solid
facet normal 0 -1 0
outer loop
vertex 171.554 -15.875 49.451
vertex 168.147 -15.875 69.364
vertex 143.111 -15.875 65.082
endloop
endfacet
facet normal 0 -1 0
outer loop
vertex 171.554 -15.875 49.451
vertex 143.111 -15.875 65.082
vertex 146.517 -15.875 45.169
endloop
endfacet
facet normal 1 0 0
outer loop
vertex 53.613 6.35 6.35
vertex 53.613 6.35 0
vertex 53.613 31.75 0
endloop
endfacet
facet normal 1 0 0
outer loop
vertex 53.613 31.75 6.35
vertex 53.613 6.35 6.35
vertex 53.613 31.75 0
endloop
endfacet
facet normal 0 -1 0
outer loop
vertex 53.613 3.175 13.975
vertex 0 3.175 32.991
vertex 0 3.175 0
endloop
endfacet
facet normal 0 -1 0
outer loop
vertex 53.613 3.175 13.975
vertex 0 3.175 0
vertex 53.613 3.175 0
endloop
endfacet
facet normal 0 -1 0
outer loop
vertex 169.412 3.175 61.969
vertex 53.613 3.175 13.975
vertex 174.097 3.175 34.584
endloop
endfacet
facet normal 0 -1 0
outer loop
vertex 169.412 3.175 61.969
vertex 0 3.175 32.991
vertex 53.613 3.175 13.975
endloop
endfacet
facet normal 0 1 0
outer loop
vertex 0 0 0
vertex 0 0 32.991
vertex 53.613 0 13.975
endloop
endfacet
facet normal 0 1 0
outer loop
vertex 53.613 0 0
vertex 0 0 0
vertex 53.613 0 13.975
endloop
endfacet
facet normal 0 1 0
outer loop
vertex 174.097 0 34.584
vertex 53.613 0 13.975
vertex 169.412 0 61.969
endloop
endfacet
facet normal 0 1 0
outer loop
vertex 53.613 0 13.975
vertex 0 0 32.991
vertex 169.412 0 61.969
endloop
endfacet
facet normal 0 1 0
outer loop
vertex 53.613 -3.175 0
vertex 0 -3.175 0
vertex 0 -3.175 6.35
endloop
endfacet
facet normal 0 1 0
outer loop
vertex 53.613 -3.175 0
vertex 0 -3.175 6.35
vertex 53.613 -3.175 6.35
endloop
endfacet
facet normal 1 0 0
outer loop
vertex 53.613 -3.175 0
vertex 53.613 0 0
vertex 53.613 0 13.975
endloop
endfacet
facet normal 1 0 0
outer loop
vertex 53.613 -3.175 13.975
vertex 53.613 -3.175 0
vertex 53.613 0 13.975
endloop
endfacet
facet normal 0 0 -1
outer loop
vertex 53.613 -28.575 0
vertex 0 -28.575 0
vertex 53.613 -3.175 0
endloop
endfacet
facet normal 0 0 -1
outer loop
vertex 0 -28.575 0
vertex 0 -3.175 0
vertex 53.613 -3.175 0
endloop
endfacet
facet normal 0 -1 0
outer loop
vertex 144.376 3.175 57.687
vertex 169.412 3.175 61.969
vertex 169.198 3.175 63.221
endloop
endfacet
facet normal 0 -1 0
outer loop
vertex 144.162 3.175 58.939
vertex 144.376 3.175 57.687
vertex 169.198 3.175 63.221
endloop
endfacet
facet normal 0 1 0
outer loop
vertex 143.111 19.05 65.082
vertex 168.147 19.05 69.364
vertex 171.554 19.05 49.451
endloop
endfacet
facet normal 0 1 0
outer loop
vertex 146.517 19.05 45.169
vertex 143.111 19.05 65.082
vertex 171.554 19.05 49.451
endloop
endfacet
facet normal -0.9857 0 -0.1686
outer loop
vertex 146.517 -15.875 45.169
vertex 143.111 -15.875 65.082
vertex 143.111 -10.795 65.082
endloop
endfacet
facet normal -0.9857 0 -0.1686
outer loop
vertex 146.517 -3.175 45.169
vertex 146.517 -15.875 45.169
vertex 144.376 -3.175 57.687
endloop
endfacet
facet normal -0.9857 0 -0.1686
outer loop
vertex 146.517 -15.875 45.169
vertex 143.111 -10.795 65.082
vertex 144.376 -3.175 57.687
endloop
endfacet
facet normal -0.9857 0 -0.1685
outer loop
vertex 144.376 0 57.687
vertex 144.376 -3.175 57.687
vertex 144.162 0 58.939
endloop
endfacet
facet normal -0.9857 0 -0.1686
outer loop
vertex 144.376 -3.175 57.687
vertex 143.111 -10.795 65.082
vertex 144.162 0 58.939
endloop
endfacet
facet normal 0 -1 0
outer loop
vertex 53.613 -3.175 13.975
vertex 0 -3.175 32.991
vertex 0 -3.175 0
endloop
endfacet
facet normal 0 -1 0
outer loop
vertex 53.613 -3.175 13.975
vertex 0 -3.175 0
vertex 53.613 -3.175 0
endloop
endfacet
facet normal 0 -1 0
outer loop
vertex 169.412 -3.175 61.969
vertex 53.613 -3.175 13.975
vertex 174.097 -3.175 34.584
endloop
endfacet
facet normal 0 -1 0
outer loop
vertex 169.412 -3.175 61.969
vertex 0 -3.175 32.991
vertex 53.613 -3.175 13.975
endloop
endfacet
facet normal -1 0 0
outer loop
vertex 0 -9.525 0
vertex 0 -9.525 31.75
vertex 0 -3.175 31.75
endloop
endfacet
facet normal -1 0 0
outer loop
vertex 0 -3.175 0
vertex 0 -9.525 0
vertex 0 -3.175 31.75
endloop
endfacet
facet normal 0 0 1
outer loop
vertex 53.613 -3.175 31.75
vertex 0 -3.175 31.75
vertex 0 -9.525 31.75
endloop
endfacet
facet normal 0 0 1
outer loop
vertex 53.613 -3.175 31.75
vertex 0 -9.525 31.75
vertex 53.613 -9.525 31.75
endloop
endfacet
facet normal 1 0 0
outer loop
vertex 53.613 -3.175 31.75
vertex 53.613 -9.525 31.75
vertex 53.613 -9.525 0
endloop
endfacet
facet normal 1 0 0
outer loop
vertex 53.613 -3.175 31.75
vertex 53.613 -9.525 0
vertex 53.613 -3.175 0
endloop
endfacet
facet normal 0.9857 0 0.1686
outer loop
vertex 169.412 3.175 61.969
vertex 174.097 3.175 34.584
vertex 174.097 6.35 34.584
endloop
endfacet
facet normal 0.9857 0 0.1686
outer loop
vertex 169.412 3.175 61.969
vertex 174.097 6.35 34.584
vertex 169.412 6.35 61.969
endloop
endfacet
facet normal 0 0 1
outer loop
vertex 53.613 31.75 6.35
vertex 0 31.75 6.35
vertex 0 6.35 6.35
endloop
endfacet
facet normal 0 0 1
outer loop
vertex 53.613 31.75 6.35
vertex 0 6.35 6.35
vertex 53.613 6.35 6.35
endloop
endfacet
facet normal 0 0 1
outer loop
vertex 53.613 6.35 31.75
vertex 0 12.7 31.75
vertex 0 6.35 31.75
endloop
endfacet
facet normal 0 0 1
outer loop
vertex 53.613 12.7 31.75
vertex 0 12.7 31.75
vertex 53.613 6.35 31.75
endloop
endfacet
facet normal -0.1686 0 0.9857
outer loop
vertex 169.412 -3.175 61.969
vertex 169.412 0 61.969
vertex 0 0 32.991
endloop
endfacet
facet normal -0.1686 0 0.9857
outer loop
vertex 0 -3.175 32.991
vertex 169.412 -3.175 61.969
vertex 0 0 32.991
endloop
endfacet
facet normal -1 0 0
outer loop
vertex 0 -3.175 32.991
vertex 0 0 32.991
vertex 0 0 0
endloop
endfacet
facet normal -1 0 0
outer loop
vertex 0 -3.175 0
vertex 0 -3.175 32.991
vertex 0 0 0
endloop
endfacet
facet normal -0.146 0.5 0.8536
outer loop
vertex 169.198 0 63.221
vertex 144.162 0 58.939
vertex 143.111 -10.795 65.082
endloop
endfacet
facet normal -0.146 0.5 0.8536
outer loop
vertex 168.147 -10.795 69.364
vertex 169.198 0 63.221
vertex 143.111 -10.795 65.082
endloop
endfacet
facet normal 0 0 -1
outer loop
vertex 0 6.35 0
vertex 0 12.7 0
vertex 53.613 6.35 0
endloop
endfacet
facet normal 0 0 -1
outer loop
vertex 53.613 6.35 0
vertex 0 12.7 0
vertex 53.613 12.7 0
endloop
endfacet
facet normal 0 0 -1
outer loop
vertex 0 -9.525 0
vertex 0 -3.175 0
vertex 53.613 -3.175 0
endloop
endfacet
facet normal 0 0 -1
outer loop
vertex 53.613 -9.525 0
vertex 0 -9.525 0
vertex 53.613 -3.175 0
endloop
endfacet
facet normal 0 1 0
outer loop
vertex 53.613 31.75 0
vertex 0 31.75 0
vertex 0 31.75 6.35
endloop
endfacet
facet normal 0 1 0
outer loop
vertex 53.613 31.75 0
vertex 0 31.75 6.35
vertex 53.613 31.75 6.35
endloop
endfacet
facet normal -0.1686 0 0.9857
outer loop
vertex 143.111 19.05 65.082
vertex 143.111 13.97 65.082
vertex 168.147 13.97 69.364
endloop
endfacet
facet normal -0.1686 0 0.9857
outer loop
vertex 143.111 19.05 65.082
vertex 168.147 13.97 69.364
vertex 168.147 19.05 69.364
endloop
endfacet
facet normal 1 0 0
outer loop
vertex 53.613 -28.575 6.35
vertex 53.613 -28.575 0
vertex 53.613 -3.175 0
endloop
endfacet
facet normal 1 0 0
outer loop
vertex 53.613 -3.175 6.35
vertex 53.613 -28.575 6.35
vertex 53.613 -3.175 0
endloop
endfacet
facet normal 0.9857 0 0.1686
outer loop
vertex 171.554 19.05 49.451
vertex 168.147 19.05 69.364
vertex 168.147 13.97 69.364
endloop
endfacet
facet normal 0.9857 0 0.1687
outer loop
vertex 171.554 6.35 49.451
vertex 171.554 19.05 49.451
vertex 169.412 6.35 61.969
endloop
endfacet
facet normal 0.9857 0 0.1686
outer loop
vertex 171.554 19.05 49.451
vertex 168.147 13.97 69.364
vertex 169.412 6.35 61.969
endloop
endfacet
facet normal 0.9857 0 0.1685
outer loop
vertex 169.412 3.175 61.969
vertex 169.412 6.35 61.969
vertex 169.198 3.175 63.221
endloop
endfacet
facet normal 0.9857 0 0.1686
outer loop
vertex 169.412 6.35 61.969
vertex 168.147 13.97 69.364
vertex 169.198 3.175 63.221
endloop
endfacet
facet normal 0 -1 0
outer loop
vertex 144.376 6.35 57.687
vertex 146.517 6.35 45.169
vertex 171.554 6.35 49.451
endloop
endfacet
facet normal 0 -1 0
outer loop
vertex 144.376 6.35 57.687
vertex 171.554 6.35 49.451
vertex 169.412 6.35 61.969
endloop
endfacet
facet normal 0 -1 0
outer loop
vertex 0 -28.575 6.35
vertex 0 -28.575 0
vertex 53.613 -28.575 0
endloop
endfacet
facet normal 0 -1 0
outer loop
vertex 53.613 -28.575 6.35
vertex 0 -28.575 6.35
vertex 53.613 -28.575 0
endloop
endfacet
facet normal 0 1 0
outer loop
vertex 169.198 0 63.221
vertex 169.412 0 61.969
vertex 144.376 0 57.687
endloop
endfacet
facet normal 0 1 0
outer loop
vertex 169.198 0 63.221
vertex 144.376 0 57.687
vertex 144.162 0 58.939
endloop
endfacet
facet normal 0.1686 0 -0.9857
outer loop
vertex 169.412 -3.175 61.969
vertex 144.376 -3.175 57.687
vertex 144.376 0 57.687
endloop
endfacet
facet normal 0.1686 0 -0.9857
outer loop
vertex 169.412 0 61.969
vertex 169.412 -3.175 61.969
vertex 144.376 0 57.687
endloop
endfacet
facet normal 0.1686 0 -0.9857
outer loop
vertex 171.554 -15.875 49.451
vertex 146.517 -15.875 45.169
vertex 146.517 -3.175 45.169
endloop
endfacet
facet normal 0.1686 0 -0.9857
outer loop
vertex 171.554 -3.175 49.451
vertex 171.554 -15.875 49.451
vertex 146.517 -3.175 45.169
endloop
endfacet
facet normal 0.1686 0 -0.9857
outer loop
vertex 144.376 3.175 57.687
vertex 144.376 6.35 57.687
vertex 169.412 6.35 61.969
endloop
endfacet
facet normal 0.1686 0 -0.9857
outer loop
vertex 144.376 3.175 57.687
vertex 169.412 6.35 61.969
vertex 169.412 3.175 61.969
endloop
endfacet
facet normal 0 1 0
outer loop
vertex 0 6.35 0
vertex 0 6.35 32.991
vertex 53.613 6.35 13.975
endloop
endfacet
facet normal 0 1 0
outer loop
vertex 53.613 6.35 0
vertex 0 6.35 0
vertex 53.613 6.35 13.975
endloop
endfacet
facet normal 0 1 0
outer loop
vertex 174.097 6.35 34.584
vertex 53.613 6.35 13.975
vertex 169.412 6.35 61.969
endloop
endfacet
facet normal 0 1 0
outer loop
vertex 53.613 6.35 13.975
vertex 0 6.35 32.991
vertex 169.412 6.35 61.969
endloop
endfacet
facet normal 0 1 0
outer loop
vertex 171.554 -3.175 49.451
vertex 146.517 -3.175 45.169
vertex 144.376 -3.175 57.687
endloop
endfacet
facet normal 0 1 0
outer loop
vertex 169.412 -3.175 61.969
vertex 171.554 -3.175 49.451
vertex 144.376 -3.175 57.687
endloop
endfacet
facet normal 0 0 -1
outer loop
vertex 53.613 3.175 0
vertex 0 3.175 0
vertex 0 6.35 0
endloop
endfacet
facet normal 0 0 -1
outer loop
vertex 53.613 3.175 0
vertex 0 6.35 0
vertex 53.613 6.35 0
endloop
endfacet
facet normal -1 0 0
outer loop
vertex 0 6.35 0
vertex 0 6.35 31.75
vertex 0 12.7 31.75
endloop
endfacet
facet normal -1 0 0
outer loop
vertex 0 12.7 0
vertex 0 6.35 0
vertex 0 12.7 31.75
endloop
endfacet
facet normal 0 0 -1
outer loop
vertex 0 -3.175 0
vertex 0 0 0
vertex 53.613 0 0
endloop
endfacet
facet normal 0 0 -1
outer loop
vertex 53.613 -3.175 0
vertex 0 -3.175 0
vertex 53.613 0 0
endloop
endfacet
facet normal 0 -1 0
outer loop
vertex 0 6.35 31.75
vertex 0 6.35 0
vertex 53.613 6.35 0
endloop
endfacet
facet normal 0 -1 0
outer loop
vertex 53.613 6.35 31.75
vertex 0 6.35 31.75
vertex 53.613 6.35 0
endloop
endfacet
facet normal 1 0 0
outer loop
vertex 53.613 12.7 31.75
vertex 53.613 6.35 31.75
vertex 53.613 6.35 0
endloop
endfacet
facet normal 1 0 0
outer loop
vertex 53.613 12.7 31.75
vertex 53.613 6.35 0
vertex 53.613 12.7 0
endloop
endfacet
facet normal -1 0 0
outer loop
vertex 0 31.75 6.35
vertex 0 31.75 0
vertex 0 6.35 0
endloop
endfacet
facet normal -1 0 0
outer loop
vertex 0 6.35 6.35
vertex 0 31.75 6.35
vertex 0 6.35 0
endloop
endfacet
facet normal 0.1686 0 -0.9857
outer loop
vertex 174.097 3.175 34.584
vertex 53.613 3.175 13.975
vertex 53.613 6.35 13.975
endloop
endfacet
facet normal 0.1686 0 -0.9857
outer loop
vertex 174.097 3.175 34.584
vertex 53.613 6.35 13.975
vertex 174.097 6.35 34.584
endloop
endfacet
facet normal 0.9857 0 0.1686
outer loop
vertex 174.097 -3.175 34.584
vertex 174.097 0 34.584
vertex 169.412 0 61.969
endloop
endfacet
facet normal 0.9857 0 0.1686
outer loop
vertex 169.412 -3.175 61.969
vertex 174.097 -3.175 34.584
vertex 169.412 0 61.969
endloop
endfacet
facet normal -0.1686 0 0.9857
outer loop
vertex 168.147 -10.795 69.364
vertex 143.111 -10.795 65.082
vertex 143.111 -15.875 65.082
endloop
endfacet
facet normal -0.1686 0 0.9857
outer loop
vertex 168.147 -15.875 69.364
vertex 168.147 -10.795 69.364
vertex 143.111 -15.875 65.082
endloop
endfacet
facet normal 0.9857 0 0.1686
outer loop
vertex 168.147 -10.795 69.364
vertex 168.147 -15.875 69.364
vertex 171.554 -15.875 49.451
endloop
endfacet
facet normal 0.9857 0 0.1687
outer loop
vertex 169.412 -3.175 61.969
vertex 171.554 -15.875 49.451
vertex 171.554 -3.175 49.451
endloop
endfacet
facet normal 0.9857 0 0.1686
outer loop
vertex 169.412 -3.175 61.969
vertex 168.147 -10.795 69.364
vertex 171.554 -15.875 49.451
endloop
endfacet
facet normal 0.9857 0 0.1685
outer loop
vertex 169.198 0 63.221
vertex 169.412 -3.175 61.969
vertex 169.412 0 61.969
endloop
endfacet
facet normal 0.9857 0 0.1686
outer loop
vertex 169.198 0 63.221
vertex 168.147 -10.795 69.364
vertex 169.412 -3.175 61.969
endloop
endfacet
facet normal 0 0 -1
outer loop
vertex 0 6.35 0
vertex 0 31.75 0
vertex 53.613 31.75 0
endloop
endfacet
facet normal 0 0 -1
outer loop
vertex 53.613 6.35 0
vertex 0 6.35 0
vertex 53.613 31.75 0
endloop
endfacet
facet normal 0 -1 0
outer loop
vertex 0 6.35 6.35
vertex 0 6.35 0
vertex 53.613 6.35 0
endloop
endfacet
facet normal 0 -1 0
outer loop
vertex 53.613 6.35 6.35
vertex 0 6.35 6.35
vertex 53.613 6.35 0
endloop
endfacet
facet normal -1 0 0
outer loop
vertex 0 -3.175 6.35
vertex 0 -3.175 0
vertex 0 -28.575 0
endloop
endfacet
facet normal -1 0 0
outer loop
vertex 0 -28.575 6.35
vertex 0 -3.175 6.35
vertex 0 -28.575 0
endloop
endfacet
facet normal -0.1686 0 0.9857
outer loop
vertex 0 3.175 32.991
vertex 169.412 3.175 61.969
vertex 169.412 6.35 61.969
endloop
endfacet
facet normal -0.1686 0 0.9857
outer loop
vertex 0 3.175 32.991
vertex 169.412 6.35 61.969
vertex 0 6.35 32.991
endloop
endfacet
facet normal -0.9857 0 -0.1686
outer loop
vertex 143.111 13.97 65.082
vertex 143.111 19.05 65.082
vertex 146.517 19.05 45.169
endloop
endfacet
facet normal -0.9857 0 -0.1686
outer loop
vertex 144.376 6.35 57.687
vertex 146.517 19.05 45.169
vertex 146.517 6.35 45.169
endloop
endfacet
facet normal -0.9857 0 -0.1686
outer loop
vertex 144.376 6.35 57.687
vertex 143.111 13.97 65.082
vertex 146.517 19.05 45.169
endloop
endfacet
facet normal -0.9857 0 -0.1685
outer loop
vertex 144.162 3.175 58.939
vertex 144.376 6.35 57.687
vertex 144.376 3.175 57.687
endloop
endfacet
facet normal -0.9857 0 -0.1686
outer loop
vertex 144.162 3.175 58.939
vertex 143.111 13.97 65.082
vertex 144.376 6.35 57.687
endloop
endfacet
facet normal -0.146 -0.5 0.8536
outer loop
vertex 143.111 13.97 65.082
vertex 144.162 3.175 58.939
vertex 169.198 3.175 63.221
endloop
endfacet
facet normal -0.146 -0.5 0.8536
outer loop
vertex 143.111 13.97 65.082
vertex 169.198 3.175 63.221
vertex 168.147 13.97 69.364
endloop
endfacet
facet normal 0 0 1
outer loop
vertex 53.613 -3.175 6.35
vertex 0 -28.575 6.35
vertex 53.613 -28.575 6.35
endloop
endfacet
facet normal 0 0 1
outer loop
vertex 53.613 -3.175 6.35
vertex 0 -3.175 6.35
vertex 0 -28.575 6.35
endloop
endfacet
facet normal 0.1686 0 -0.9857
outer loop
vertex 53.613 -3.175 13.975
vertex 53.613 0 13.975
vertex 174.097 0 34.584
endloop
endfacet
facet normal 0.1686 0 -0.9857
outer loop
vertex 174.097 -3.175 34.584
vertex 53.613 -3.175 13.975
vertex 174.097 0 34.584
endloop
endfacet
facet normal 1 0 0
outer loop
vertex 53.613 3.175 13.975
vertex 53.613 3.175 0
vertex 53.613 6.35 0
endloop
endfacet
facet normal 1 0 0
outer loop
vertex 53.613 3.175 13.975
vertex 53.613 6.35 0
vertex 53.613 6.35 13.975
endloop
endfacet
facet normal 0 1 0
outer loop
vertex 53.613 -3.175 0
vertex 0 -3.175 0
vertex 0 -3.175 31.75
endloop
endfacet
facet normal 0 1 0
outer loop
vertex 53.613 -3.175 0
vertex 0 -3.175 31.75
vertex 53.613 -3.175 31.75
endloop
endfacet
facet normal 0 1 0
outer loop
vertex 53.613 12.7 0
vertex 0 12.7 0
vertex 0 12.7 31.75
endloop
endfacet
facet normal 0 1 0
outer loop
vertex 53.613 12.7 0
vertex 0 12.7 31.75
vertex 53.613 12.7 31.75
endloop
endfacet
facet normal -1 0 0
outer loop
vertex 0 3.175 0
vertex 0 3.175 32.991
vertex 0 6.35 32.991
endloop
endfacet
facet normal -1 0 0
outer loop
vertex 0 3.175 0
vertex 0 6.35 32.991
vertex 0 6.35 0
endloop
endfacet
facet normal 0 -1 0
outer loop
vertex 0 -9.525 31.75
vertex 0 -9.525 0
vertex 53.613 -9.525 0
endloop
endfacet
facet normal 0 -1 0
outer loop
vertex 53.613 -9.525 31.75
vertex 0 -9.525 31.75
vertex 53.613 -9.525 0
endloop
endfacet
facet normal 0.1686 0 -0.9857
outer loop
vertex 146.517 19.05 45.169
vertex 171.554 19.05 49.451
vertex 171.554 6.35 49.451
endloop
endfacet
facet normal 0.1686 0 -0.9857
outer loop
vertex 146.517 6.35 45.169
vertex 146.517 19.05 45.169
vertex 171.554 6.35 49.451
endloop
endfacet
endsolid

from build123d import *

# Parameters (mm, degrees)
F1_DEPTH = 3.175
F3_DEPTH = 25.4
F6_W     = 53.6130187661
F6_H     = 19.05
F6_H_2   = 6.35
F7_DEPTH = 6.35
F8_DEPTH = 31.75


with BuildPart() as f1:
    # F0 (on Front) → F1 (new body)
    with BuildSketch(Plane.XZ):
        Polygon((0, 32.9908281565), (0, 0), (53.6130187661, 0), (53.6130187661, 13.97496396), (174.096722805, 34.5840183194), (169.4124042988, 61.9692653418), align=None)
    extrude(amount=F1_DEPTH)


with BuildPart() as f3:
    # F2 (on face) → F3 (new body)
    with BuildSketch(Plane(origin=(174.8951524573, 0, 29.9162756734), x_dir=(0, 1, 0), z_dir=(0.9856839001, 0, 0.1686038227))):
        Polygon((-3.175, 32.5185281655), (0, 32.5185281655), (0, 33.7885281655), (-10.795, 40.0210243214), (-15.875, 40.0210243214), (-15.875, 19.8185281655), (-3.175, 19.8185281655), align=None)
    extrude(amount=-F3_DEPTH)


with BuildPart() as f5_1:
    # F5: instance of F3
    add(f3.part.mirror(Plane.XZ.offset(-1.5875)))


with BuildPart() as f5_2:
    # F5: instance of F1
    add(f1.part.mirror(Plane.XZ.offset(-1.5875)))


with BuildPart() as f7:
    # F6 (on Top) → F7 (new body)
    with BuildSketch(Plane.XY):
        with Locations((26.806509383, -19.05)):
            Rectangle(F6_W, F6_H)
        with Locations((26.806509383, -6.35)):
            Rectangle(F6_W, F6_H_2)
    extrude(amount=F7_DEPTH)


with BuildPart() as f7b:
    # F6 (on Top) → F7, piece 2 (new body)
    with BuildSketch(Plane.XY):
        with Locations((26.806509383, 22.225)):
            Rectangle(F6_W, F6_H)
        with Locations((26.806509383, 9.525)):
            Rectangle(F6_W, F6_H_2)
    extrude(amount=F7_DEPTH)


with BuildPart() as f8:
    # F6 (on Top) → F8 (new body)
    with BuildSketch(Plane.XY):
        with Locations((26.806509383, 9.525)):
            Rectangle(F6_W, F6_H_2)
    extrude(amount=F8_DEPTH)


with BuildPart() as f8b:
    # F6 (on Top) → F8, piece 2 (new body)
    with BuildSketch(Plane.XY):
        with Locations((26.806509383, -6.35)):
            Rectangle(F6_W, F6_H_2)
    extrude(amount=F8_DEPTH)


solid = Compound([f1.part, f3.part, f5_1.part, f5_2.part, f7.part, f7b.part, f8.part, f8b.part])
